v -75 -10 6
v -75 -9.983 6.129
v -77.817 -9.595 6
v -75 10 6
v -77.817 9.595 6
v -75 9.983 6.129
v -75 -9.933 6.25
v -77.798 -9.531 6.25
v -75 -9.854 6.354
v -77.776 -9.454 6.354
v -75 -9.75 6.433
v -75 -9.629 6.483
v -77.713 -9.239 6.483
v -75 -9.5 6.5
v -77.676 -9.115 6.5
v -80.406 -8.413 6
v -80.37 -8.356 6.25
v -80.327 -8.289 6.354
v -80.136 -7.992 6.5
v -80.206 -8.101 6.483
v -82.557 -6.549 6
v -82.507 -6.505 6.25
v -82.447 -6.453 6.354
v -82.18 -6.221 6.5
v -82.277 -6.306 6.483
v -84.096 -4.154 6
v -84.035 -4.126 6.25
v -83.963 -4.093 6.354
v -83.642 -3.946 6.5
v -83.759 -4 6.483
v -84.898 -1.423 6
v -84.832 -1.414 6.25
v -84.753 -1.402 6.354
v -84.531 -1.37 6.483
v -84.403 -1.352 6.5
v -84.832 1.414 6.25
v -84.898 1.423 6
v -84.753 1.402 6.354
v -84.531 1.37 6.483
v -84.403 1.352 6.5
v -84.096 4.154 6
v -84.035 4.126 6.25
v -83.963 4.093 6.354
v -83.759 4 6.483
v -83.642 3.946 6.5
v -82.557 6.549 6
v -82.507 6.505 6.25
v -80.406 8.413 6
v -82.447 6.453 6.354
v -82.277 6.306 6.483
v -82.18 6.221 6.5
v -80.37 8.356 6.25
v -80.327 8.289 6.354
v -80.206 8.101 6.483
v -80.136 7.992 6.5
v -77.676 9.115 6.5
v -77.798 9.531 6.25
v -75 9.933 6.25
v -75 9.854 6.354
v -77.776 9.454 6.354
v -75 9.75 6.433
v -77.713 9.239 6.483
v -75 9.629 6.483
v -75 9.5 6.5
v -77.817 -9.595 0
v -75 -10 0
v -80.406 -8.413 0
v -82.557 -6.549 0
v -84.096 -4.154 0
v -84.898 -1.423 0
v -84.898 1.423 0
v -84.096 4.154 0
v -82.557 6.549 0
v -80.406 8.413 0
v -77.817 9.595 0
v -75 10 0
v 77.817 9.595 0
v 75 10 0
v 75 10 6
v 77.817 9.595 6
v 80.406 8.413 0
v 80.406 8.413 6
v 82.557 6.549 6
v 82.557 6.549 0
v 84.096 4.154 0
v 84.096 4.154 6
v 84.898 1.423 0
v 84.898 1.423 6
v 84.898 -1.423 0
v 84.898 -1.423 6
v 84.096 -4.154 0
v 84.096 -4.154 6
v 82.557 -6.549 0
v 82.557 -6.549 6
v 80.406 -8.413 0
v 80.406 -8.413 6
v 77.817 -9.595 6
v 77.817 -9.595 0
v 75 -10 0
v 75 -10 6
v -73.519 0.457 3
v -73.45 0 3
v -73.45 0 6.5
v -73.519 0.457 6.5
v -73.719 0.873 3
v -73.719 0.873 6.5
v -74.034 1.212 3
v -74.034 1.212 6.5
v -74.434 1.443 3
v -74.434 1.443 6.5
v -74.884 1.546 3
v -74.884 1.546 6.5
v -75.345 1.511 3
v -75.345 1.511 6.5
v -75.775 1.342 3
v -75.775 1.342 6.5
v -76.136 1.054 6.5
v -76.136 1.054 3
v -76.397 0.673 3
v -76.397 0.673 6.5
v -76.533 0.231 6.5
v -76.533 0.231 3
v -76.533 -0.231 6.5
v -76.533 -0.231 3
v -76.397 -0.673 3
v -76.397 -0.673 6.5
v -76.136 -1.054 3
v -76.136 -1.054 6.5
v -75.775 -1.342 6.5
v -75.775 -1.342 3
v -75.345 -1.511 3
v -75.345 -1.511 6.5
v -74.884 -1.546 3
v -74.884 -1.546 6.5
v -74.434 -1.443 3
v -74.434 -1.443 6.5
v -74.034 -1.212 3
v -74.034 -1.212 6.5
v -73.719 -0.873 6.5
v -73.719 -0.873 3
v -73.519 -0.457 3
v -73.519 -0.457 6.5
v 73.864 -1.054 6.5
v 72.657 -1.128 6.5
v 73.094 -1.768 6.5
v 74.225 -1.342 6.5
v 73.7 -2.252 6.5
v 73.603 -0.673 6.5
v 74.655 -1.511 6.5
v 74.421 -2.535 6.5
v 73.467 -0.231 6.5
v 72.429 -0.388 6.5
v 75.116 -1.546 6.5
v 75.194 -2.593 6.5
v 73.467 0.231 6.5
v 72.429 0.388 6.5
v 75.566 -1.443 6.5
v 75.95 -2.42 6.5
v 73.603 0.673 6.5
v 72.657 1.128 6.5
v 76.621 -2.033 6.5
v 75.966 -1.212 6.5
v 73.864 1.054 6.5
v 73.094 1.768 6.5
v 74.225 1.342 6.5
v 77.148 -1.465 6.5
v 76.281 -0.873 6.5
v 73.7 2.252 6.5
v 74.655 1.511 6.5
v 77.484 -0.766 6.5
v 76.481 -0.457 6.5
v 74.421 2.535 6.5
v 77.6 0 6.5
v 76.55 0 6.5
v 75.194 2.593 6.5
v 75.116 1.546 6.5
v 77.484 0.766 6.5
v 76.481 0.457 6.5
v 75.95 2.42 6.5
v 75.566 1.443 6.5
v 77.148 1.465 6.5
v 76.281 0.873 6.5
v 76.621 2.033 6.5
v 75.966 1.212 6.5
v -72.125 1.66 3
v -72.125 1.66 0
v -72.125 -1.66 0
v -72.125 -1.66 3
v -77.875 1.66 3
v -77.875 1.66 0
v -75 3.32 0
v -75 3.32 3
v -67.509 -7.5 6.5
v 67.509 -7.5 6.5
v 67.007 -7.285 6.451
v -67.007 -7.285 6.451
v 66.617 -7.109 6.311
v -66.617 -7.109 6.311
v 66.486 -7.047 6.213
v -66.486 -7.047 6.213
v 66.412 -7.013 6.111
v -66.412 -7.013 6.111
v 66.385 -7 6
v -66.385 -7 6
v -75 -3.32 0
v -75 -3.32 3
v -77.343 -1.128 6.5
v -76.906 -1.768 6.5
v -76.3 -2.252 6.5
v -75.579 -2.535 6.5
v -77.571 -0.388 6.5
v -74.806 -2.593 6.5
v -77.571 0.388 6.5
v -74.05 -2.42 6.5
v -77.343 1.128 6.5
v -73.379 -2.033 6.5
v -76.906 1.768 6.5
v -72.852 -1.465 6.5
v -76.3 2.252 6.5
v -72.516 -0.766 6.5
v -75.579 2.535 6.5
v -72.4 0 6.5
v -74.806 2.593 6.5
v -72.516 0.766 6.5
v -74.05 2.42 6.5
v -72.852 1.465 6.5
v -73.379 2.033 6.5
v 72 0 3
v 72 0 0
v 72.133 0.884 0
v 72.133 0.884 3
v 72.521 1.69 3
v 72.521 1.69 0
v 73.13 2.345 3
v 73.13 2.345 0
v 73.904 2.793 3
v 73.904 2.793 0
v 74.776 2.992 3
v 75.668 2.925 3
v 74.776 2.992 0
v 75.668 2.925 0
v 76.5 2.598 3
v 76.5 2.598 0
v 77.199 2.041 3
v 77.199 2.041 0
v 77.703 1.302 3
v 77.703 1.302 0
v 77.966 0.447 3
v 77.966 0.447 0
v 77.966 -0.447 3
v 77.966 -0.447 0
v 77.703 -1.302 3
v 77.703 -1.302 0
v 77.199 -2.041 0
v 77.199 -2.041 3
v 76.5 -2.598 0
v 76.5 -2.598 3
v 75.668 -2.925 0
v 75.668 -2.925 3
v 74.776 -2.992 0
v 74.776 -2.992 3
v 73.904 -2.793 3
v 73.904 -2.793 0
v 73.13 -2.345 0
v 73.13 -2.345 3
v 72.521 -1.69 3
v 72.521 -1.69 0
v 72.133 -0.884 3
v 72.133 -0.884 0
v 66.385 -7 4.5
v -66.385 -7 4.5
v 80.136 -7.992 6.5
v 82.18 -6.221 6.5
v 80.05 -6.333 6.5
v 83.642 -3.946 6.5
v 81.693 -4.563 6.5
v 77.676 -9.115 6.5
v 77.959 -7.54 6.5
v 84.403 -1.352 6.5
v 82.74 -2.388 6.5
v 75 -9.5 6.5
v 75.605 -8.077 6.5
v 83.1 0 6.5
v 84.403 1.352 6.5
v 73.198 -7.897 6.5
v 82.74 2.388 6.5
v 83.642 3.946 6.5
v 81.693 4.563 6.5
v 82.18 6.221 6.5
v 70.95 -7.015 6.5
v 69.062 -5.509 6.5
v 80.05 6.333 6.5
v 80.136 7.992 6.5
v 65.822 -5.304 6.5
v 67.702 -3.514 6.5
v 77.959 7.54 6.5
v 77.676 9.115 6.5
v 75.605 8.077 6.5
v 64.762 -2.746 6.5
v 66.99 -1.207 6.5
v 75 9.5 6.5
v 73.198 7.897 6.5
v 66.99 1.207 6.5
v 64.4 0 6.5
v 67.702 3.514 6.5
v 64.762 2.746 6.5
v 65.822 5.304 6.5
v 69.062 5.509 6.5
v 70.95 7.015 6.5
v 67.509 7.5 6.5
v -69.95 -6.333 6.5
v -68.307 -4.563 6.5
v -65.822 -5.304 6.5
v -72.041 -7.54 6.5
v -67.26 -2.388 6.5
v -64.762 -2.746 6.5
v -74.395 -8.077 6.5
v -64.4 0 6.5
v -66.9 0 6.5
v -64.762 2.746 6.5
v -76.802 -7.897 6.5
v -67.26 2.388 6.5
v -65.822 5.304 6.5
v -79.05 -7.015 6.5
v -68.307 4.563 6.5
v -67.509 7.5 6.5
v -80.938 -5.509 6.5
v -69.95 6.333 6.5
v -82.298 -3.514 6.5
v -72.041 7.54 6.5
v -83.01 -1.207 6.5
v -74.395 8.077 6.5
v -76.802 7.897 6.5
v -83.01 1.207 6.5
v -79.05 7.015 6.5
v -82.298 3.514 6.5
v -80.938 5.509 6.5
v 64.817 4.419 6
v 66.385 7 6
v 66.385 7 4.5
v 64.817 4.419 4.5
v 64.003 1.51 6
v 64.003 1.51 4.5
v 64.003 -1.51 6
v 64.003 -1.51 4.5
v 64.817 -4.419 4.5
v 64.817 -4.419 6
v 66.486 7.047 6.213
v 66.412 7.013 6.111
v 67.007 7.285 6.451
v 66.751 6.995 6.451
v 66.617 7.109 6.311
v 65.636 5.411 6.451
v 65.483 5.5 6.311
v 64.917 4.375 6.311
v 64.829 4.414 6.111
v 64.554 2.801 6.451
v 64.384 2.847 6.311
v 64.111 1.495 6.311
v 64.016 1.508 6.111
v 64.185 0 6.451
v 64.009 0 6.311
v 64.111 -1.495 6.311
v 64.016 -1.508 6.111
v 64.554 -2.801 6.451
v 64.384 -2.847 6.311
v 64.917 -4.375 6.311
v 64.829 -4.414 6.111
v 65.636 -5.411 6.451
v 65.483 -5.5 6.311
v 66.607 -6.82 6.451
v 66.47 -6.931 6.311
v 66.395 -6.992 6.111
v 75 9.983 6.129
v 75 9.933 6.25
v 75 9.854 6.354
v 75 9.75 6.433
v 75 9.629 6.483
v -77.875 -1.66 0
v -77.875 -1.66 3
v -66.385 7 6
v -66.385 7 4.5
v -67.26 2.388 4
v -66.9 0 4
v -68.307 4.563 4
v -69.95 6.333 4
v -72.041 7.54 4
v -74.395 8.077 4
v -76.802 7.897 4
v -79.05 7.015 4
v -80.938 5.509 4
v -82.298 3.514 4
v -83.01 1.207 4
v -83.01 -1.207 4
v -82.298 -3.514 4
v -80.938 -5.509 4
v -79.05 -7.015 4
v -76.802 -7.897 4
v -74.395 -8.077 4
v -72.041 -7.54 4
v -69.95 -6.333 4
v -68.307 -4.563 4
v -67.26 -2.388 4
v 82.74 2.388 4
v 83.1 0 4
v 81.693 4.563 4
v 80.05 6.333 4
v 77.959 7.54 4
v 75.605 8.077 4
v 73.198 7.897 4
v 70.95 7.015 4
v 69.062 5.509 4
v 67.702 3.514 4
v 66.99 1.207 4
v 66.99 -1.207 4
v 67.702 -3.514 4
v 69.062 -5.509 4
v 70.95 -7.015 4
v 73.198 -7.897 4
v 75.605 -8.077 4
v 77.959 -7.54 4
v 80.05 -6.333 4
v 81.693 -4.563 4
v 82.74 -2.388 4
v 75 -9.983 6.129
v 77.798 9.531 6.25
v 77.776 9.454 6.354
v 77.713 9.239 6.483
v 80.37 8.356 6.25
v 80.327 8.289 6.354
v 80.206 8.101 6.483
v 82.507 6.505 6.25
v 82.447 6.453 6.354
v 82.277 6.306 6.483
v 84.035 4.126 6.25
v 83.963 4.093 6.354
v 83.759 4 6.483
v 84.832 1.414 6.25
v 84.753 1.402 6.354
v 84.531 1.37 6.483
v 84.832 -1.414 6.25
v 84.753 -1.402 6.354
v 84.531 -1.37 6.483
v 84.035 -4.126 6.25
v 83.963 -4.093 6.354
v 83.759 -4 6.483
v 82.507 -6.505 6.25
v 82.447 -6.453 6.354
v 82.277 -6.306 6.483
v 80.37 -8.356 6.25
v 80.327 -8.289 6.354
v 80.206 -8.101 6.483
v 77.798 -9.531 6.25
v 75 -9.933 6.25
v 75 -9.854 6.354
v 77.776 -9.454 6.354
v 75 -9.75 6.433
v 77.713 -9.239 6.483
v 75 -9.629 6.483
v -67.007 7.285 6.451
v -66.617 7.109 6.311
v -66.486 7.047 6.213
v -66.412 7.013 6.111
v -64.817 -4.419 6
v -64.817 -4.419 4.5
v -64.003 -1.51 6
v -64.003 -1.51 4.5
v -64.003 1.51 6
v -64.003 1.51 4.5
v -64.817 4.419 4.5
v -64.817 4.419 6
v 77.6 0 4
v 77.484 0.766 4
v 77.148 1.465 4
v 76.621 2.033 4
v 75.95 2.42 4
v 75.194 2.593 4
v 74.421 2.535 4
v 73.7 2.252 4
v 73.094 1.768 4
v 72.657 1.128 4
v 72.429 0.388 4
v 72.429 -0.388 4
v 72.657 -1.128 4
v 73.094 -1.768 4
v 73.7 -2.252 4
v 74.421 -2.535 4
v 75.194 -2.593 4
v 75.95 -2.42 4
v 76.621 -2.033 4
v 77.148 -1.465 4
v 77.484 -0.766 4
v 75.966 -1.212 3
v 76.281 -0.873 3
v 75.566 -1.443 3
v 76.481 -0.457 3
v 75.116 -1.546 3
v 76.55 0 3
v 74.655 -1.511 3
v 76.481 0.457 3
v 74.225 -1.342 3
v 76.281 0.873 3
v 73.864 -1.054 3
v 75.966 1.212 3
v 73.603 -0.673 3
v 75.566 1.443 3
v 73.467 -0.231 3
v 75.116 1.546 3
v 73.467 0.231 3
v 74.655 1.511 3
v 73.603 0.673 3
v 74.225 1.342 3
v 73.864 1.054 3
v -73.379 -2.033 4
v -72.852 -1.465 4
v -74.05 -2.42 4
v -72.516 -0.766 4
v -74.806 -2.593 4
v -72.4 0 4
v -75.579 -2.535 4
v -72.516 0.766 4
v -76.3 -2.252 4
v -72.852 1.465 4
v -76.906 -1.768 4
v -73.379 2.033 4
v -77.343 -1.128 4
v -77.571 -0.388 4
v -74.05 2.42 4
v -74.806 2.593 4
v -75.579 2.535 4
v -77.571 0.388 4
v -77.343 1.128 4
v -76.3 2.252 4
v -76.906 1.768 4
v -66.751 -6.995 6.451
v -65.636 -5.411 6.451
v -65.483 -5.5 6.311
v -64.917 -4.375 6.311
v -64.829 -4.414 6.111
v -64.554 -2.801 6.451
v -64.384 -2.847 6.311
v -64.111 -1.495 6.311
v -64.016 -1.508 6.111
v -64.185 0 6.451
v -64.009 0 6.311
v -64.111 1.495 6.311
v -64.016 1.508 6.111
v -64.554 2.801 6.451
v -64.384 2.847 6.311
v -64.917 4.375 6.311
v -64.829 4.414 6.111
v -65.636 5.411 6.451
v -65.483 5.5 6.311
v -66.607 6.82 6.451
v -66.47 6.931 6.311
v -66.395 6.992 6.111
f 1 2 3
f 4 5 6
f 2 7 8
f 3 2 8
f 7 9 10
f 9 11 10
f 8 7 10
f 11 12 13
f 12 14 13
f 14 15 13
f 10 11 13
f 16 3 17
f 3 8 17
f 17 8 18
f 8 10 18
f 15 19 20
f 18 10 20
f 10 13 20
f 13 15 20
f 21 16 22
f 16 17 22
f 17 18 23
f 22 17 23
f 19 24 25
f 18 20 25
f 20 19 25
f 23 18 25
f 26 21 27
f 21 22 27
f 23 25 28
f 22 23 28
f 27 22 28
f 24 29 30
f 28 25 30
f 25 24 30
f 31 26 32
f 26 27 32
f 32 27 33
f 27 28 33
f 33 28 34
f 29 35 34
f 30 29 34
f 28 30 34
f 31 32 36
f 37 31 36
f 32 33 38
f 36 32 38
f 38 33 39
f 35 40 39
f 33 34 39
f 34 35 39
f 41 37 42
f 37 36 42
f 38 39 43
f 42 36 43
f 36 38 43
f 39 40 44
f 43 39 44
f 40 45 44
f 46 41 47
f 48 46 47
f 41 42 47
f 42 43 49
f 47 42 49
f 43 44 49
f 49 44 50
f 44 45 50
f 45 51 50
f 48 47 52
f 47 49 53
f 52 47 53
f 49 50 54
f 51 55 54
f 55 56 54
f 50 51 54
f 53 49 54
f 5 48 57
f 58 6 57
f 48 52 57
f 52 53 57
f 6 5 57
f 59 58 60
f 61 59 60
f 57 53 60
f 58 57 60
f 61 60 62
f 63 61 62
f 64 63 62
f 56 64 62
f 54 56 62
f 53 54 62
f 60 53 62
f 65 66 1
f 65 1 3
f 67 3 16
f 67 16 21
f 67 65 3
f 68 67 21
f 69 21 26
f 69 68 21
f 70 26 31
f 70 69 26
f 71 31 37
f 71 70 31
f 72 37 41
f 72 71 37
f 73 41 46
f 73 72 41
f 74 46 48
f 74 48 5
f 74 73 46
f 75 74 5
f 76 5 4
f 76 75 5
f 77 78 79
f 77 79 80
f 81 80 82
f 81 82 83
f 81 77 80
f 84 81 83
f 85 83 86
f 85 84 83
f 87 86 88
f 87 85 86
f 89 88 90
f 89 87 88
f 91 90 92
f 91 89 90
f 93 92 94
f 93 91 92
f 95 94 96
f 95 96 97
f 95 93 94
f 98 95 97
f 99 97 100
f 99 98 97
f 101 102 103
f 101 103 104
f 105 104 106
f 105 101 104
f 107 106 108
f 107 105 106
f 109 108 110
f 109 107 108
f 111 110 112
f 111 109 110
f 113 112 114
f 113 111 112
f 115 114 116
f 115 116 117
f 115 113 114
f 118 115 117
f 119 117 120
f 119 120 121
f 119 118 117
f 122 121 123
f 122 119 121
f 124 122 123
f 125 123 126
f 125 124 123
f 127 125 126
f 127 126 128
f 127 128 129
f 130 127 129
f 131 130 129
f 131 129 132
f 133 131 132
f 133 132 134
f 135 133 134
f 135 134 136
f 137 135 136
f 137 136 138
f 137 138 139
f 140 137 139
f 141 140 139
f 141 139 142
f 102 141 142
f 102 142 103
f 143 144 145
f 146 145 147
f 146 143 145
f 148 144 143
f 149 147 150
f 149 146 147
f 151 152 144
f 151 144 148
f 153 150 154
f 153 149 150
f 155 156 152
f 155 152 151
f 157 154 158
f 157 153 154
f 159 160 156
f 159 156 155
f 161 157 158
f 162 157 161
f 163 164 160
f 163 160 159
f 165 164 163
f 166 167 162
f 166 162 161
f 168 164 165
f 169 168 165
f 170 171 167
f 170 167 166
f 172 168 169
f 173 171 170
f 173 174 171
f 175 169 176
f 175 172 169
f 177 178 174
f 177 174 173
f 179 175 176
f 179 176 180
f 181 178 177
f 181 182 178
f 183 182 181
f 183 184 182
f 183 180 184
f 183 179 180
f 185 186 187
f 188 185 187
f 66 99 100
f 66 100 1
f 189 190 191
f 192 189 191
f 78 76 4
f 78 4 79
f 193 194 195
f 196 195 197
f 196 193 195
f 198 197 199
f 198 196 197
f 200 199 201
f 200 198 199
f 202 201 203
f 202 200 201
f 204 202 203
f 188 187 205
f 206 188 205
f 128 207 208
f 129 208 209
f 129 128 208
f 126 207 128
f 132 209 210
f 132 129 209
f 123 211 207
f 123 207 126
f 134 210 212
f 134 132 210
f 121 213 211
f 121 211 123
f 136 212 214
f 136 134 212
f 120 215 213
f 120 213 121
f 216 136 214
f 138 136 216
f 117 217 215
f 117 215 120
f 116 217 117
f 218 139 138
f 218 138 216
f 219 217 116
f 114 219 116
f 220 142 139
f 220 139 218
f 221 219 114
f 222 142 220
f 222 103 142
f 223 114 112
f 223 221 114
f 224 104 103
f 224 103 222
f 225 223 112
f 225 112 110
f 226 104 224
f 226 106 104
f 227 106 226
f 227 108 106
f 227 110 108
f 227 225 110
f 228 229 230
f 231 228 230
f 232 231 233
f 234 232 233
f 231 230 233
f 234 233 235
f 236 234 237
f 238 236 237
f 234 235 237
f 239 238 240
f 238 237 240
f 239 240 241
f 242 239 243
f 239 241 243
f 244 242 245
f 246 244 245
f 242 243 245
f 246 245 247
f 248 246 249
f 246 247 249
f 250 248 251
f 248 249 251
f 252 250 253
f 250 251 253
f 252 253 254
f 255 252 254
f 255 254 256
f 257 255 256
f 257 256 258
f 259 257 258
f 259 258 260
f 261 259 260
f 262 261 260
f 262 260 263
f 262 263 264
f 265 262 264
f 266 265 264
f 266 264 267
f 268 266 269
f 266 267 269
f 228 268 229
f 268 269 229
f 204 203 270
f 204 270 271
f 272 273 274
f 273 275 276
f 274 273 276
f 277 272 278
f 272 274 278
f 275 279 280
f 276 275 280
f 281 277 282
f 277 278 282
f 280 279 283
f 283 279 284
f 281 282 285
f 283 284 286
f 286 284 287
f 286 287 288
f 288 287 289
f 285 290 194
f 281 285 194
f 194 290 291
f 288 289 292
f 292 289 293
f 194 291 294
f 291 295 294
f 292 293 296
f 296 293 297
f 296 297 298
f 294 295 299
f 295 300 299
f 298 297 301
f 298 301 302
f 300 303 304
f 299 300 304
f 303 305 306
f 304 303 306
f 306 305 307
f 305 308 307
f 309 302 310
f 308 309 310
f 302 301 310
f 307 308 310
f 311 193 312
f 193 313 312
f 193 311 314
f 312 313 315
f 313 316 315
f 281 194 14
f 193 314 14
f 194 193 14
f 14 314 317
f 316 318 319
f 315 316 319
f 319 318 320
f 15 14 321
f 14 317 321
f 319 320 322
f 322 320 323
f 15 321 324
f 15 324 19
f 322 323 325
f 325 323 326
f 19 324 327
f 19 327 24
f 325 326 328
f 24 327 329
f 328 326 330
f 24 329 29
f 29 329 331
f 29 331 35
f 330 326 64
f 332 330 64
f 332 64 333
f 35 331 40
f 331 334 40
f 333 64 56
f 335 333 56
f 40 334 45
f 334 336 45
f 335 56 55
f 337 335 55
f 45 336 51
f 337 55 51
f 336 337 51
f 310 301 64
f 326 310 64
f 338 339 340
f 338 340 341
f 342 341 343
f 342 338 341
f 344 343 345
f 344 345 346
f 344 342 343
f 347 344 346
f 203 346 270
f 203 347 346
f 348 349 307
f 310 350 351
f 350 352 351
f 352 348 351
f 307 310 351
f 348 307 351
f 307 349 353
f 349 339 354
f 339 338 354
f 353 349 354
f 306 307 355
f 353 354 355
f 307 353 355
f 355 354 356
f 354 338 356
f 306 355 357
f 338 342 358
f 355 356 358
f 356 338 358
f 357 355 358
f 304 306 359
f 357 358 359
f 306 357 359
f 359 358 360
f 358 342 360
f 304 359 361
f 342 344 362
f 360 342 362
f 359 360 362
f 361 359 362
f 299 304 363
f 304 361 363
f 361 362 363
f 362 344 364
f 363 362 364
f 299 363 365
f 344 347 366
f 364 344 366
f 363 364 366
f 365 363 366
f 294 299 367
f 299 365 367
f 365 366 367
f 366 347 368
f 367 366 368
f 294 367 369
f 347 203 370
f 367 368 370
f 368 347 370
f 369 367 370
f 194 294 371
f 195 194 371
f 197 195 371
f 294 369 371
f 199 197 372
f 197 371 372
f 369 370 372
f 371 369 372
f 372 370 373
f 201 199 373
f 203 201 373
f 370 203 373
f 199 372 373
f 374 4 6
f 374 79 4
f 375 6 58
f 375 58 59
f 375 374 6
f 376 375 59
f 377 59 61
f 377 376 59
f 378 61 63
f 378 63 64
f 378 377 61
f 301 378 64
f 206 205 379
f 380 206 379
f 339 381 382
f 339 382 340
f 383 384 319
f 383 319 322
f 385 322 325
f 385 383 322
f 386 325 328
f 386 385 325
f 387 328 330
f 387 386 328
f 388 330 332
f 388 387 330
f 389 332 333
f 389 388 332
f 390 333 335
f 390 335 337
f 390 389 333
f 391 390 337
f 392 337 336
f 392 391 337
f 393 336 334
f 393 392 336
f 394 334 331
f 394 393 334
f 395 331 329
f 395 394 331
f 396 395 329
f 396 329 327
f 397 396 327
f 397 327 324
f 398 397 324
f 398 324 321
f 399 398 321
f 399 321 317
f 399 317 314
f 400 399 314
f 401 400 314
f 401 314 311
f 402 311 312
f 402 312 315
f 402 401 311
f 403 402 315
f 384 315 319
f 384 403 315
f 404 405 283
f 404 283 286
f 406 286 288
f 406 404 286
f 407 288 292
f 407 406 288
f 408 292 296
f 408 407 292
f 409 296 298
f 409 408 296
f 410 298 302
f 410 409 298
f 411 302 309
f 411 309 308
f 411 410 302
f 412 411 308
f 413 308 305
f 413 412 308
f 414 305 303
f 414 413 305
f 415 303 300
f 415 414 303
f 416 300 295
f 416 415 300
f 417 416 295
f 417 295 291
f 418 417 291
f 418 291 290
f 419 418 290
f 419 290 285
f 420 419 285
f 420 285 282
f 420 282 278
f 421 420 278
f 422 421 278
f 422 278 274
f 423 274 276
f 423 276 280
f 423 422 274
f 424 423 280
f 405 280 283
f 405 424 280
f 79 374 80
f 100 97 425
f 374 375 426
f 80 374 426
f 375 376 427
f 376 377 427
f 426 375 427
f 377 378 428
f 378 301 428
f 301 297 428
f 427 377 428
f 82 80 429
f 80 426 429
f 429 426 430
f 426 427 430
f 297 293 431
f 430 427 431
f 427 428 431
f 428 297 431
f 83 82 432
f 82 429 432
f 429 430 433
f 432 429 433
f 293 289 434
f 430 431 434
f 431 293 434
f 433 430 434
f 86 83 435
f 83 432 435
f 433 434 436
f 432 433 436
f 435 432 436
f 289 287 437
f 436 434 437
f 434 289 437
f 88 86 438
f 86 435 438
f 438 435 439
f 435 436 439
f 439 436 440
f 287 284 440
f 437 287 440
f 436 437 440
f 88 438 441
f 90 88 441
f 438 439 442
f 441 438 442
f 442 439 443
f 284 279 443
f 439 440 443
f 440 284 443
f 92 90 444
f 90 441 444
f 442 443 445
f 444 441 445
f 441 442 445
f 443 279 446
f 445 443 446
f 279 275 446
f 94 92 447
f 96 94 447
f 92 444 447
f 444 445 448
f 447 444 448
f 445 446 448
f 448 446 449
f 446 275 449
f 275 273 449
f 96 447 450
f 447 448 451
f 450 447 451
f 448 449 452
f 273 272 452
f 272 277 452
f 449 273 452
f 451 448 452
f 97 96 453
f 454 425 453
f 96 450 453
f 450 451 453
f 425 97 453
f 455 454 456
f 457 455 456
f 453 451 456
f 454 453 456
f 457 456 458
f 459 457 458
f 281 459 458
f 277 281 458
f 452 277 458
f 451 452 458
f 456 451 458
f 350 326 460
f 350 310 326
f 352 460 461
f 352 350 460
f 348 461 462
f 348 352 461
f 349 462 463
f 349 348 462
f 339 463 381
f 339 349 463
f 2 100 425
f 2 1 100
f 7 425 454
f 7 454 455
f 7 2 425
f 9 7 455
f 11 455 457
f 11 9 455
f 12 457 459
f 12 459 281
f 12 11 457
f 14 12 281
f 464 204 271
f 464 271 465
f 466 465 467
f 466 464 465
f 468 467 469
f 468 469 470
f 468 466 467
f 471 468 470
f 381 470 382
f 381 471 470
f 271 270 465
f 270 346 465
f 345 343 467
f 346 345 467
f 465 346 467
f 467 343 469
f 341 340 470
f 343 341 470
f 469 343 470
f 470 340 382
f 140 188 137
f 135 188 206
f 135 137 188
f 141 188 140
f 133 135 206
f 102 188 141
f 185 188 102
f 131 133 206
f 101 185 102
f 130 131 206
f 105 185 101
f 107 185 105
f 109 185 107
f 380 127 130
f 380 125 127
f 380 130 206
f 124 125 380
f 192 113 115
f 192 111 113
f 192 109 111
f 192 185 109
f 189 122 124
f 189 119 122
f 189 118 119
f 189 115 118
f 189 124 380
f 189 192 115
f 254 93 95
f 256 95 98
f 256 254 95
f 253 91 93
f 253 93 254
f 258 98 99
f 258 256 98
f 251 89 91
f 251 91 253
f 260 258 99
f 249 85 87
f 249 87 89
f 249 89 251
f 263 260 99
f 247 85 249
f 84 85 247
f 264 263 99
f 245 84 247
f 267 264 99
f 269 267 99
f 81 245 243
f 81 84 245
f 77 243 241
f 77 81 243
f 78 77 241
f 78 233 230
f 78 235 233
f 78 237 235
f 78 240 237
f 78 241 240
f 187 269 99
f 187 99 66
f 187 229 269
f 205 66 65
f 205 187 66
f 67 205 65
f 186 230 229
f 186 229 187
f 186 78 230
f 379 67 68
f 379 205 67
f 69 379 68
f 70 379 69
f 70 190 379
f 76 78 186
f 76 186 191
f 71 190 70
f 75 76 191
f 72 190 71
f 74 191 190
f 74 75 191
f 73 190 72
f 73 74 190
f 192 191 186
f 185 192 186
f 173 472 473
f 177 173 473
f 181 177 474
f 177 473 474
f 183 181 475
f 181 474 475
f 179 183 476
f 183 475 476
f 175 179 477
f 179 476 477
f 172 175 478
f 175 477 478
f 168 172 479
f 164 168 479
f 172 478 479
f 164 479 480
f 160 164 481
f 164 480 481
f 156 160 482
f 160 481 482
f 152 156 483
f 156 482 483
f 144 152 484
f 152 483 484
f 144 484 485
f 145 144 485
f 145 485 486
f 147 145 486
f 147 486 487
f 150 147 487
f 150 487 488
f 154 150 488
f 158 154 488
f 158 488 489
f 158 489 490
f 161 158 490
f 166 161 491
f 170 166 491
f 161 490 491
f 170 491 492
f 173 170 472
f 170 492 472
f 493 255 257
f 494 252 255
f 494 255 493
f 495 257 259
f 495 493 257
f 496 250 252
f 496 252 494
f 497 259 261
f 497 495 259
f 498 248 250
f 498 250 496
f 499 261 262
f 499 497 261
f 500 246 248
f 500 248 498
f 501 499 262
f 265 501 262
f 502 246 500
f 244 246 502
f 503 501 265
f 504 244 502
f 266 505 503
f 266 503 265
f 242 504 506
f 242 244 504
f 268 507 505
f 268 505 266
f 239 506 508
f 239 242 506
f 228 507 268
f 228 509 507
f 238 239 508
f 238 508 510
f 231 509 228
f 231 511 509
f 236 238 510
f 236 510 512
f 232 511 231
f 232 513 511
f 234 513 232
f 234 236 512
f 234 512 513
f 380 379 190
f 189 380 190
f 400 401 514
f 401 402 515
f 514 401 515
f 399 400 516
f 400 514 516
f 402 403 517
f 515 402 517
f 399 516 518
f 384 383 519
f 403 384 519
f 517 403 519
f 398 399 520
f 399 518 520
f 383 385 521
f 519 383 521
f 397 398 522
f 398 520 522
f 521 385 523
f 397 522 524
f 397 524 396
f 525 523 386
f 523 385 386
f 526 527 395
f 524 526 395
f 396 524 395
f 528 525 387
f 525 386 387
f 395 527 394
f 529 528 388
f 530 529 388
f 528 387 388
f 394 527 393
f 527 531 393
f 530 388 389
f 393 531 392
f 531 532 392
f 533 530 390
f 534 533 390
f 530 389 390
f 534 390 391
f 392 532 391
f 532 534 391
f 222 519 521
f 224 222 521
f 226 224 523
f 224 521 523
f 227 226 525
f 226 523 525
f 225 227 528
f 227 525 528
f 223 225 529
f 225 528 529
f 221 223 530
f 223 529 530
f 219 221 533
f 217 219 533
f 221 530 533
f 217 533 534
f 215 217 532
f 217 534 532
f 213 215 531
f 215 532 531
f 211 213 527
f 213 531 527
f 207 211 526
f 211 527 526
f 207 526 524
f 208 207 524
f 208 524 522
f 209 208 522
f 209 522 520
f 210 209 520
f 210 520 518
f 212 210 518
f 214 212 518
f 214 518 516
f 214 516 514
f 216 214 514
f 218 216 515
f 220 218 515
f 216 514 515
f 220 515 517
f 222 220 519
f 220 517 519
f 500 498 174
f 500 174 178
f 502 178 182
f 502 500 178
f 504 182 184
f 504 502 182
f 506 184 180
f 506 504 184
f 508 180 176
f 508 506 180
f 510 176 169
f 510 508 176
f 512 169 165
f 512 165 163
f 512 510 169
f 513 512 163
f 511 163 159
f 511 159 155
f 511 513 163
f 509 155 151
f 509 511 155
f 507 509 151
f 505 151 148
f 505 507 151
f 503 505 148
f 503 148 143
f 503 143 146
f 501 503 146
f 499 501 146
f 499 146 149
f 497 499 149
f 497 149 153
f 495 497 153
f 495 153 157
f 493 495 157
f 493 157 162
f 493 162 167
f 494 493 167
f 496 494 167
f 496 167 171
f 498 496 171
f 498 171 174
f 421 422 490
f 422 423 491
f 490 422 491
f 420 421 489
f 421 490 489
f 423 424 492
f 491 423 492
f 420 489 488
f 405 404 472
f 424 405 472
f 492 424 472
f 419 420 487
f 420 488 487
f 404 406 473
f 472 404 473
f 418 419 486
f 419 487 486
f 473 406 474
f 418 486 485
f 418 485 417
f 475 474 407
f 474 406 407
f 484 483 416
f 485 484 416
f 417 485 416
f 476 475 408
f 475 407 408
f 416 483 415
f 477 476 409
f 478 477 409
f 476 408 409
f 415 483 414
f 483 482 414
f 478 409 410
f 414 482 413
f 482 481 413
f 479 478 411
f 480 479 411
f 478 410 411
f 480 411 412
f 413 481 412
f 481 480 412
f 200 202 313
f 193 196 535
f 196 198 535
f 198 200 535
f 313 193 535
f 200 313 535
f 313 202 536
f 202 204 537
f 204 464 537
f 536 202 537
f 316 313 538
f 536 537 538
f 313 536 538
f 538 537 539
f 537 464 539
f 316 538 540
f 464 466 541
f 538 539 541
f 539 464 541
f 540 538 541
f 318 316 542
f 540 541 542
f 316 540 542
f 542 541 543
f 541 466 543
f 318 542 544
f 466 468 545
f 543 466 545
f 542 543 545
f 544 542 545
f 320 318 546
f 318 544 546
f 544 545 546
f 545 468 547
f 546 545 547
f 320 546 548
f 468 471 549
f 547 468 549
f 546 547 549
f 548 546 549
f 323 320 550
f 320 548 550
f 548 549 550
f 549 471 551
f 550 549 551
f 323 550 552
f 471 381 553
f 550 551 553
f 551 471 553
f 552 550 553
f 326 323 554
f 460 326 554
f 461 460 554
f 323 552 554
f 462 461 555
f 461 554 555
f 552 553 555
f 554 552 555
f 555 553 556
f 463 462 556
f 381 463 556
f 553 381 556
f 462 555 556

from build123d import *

# Parameters (mm, degrees)
BASE_R              = 2.6
BASE_R_2            = 8.1
BASE_R_3            = 1.55
BOSS_EXTRUDE1_DEPTH = 4
BOSS_EXTRUDE2_START = 4
BASE_3_R            = 8.1
BASE_3_R_2          = 2.6
BASE_3_R_3          = 1.55
BOSS_EXTRUDE2_DEPTH = 2.5
SKETCH2_R           = 3
CUT_EXTRUDE1_DEPTH  = 3
CUT_EXTRUDE2_DEPTH  = 2
FILLET1_R           = 0.5


with BuildPart() as part:
    # Base → Boss-Extrude1 (new body)
    with BuildSketch(Plane.XY):
        with BuildLine():
            ThreePointArc((75, 10), (85, 0), (75, -10))
            Line((75, -10), (-75, -10))
            ThreePointArc((-75, -10), (-85, 0), (-75, 10))
            Line((-75, 10), (75, 10))
        make_face()
        with Locations((75, 0)):
            Circle(BASE_R, mode=Mode.SUBTRACT)
        with Locations((-75, 0)):
            Circle(BASE_R, mode=Mode.SUBTRACT)
        with Locations((75, 0)):
            Circle(BASE_R_2)
        with Locations((75, 0)):
            Circle(BASE_R, mode=Mode.SUBTRACT)
        with Locations((75, 0)):
            Circle(BASE_R)
        with Locations((75, 0)):
            Circle(BASE_R_3, mode=Mode.SUBTRACT)
        with Locations((-75, 0)):
            Circle(BASE_R_2)
        with Locations((-75, 0)):
            Circle(BASE_R, mode=Mode.SUBTRACT)
        with Locations((-75, 0)):
            Circle(BASE_R)
        with Locations((-75, 0)):
            Circle(BASE_R_3, mode=Mode.SUBTRACT)
    extrude(amount=BOSS_EXTRUDE1_DEPTH)

    # Base<3> → Boss-Extrude2 (add)
    with BuildSketch(Plane.XY.offset(BOSS_EXTRUDE2_START)):
        with BuildLine():
            ThreePointArc((75, 10), (85, 0), (75, -10))
            Line((75, -10), (-75, -10))
            ThreePointArc((-75, -10), (-85, 0), (-75, 10))
            Line((-75, 10), (75, 10))
        make_face()
        with Locations((-75, 0)):
            Circle(BASE_3_R, mode=Mode.SUBTRACT)
        with Locations((75, 0)):
            Circle(BASE_3_R, mode=Mode.SUBTRACT)
        with Locations((75, 0)):
            Circle(BASE_3_R_2)
        with Locations((75, 0)):
            Circle(BASE_3_R_3, mode=Mode.SUBTRACT)
        with Locations((-75, 0)):
            Circle(BASE_3_R_2)
        with Locations((-75, 0)):
            Circle(BASE_3_R_3, mode=Mode.SUBTRACT)
    extrude(amount=BOSS_EXTRUDE2_DEPTH)

    # Sketch2 → Cut-Extrude1 (cut)
    with BuildSketch(Plane(origin=(0, 0, 0), x_dir=(-1, 0, 0), z_dir=(0, 0, -1))):
        with Locations((-75, 0)):
            Circle(SKETCH2_R)
        Polygon((72.125, 1.659882024), (72.125, -1.659882024), (75, -3.319764048), (77.875, -1.659882024), (77.875, 1.659882024), (75, 3.319764048), align=None)
    extrude(amount=-CUT_EXTRUDE1_DEPTH, mode=Mode.SUBTRACT)

    # Sketch3 → Cut-Extrude2 (cut)
    with BuildSketch(Plane.XY.offset(6.5)):
        with BuildLine():
            Line((66.385477378, -7), (-66.385477378, -7))
            ThreePointArc((-66.385477378, -7), (-63.9, 0), (-66.385477378, 7))
            Line((-66.385477378, 7), (66.385477378, 7))
            ThreePointArc((66.385477378, 7), (63.9, 0), (66.385477378, -7))
        make_face()
    extrude(amount=-CUT_EXTRUDE2_DEPTH, mode=Mode.SUBTRACT)

    # Fillet1
    fillet1_edges = [part.edges().sort_by_distance(p)[0] for p in [
        (85, 0, 6.5),
        (0, 10, 6.5),
        (-85, 0, 6.5),
        (0, -10, 6.5),
        (63.9, 0, 6.5),
        (0, 7, 6.5),
        (-63.9, 0, 6.5),
        (0, -7, 6.5),
    ]]
    fillet(fillet1_edges, radius=FILLET1_R)


solid = part.part
